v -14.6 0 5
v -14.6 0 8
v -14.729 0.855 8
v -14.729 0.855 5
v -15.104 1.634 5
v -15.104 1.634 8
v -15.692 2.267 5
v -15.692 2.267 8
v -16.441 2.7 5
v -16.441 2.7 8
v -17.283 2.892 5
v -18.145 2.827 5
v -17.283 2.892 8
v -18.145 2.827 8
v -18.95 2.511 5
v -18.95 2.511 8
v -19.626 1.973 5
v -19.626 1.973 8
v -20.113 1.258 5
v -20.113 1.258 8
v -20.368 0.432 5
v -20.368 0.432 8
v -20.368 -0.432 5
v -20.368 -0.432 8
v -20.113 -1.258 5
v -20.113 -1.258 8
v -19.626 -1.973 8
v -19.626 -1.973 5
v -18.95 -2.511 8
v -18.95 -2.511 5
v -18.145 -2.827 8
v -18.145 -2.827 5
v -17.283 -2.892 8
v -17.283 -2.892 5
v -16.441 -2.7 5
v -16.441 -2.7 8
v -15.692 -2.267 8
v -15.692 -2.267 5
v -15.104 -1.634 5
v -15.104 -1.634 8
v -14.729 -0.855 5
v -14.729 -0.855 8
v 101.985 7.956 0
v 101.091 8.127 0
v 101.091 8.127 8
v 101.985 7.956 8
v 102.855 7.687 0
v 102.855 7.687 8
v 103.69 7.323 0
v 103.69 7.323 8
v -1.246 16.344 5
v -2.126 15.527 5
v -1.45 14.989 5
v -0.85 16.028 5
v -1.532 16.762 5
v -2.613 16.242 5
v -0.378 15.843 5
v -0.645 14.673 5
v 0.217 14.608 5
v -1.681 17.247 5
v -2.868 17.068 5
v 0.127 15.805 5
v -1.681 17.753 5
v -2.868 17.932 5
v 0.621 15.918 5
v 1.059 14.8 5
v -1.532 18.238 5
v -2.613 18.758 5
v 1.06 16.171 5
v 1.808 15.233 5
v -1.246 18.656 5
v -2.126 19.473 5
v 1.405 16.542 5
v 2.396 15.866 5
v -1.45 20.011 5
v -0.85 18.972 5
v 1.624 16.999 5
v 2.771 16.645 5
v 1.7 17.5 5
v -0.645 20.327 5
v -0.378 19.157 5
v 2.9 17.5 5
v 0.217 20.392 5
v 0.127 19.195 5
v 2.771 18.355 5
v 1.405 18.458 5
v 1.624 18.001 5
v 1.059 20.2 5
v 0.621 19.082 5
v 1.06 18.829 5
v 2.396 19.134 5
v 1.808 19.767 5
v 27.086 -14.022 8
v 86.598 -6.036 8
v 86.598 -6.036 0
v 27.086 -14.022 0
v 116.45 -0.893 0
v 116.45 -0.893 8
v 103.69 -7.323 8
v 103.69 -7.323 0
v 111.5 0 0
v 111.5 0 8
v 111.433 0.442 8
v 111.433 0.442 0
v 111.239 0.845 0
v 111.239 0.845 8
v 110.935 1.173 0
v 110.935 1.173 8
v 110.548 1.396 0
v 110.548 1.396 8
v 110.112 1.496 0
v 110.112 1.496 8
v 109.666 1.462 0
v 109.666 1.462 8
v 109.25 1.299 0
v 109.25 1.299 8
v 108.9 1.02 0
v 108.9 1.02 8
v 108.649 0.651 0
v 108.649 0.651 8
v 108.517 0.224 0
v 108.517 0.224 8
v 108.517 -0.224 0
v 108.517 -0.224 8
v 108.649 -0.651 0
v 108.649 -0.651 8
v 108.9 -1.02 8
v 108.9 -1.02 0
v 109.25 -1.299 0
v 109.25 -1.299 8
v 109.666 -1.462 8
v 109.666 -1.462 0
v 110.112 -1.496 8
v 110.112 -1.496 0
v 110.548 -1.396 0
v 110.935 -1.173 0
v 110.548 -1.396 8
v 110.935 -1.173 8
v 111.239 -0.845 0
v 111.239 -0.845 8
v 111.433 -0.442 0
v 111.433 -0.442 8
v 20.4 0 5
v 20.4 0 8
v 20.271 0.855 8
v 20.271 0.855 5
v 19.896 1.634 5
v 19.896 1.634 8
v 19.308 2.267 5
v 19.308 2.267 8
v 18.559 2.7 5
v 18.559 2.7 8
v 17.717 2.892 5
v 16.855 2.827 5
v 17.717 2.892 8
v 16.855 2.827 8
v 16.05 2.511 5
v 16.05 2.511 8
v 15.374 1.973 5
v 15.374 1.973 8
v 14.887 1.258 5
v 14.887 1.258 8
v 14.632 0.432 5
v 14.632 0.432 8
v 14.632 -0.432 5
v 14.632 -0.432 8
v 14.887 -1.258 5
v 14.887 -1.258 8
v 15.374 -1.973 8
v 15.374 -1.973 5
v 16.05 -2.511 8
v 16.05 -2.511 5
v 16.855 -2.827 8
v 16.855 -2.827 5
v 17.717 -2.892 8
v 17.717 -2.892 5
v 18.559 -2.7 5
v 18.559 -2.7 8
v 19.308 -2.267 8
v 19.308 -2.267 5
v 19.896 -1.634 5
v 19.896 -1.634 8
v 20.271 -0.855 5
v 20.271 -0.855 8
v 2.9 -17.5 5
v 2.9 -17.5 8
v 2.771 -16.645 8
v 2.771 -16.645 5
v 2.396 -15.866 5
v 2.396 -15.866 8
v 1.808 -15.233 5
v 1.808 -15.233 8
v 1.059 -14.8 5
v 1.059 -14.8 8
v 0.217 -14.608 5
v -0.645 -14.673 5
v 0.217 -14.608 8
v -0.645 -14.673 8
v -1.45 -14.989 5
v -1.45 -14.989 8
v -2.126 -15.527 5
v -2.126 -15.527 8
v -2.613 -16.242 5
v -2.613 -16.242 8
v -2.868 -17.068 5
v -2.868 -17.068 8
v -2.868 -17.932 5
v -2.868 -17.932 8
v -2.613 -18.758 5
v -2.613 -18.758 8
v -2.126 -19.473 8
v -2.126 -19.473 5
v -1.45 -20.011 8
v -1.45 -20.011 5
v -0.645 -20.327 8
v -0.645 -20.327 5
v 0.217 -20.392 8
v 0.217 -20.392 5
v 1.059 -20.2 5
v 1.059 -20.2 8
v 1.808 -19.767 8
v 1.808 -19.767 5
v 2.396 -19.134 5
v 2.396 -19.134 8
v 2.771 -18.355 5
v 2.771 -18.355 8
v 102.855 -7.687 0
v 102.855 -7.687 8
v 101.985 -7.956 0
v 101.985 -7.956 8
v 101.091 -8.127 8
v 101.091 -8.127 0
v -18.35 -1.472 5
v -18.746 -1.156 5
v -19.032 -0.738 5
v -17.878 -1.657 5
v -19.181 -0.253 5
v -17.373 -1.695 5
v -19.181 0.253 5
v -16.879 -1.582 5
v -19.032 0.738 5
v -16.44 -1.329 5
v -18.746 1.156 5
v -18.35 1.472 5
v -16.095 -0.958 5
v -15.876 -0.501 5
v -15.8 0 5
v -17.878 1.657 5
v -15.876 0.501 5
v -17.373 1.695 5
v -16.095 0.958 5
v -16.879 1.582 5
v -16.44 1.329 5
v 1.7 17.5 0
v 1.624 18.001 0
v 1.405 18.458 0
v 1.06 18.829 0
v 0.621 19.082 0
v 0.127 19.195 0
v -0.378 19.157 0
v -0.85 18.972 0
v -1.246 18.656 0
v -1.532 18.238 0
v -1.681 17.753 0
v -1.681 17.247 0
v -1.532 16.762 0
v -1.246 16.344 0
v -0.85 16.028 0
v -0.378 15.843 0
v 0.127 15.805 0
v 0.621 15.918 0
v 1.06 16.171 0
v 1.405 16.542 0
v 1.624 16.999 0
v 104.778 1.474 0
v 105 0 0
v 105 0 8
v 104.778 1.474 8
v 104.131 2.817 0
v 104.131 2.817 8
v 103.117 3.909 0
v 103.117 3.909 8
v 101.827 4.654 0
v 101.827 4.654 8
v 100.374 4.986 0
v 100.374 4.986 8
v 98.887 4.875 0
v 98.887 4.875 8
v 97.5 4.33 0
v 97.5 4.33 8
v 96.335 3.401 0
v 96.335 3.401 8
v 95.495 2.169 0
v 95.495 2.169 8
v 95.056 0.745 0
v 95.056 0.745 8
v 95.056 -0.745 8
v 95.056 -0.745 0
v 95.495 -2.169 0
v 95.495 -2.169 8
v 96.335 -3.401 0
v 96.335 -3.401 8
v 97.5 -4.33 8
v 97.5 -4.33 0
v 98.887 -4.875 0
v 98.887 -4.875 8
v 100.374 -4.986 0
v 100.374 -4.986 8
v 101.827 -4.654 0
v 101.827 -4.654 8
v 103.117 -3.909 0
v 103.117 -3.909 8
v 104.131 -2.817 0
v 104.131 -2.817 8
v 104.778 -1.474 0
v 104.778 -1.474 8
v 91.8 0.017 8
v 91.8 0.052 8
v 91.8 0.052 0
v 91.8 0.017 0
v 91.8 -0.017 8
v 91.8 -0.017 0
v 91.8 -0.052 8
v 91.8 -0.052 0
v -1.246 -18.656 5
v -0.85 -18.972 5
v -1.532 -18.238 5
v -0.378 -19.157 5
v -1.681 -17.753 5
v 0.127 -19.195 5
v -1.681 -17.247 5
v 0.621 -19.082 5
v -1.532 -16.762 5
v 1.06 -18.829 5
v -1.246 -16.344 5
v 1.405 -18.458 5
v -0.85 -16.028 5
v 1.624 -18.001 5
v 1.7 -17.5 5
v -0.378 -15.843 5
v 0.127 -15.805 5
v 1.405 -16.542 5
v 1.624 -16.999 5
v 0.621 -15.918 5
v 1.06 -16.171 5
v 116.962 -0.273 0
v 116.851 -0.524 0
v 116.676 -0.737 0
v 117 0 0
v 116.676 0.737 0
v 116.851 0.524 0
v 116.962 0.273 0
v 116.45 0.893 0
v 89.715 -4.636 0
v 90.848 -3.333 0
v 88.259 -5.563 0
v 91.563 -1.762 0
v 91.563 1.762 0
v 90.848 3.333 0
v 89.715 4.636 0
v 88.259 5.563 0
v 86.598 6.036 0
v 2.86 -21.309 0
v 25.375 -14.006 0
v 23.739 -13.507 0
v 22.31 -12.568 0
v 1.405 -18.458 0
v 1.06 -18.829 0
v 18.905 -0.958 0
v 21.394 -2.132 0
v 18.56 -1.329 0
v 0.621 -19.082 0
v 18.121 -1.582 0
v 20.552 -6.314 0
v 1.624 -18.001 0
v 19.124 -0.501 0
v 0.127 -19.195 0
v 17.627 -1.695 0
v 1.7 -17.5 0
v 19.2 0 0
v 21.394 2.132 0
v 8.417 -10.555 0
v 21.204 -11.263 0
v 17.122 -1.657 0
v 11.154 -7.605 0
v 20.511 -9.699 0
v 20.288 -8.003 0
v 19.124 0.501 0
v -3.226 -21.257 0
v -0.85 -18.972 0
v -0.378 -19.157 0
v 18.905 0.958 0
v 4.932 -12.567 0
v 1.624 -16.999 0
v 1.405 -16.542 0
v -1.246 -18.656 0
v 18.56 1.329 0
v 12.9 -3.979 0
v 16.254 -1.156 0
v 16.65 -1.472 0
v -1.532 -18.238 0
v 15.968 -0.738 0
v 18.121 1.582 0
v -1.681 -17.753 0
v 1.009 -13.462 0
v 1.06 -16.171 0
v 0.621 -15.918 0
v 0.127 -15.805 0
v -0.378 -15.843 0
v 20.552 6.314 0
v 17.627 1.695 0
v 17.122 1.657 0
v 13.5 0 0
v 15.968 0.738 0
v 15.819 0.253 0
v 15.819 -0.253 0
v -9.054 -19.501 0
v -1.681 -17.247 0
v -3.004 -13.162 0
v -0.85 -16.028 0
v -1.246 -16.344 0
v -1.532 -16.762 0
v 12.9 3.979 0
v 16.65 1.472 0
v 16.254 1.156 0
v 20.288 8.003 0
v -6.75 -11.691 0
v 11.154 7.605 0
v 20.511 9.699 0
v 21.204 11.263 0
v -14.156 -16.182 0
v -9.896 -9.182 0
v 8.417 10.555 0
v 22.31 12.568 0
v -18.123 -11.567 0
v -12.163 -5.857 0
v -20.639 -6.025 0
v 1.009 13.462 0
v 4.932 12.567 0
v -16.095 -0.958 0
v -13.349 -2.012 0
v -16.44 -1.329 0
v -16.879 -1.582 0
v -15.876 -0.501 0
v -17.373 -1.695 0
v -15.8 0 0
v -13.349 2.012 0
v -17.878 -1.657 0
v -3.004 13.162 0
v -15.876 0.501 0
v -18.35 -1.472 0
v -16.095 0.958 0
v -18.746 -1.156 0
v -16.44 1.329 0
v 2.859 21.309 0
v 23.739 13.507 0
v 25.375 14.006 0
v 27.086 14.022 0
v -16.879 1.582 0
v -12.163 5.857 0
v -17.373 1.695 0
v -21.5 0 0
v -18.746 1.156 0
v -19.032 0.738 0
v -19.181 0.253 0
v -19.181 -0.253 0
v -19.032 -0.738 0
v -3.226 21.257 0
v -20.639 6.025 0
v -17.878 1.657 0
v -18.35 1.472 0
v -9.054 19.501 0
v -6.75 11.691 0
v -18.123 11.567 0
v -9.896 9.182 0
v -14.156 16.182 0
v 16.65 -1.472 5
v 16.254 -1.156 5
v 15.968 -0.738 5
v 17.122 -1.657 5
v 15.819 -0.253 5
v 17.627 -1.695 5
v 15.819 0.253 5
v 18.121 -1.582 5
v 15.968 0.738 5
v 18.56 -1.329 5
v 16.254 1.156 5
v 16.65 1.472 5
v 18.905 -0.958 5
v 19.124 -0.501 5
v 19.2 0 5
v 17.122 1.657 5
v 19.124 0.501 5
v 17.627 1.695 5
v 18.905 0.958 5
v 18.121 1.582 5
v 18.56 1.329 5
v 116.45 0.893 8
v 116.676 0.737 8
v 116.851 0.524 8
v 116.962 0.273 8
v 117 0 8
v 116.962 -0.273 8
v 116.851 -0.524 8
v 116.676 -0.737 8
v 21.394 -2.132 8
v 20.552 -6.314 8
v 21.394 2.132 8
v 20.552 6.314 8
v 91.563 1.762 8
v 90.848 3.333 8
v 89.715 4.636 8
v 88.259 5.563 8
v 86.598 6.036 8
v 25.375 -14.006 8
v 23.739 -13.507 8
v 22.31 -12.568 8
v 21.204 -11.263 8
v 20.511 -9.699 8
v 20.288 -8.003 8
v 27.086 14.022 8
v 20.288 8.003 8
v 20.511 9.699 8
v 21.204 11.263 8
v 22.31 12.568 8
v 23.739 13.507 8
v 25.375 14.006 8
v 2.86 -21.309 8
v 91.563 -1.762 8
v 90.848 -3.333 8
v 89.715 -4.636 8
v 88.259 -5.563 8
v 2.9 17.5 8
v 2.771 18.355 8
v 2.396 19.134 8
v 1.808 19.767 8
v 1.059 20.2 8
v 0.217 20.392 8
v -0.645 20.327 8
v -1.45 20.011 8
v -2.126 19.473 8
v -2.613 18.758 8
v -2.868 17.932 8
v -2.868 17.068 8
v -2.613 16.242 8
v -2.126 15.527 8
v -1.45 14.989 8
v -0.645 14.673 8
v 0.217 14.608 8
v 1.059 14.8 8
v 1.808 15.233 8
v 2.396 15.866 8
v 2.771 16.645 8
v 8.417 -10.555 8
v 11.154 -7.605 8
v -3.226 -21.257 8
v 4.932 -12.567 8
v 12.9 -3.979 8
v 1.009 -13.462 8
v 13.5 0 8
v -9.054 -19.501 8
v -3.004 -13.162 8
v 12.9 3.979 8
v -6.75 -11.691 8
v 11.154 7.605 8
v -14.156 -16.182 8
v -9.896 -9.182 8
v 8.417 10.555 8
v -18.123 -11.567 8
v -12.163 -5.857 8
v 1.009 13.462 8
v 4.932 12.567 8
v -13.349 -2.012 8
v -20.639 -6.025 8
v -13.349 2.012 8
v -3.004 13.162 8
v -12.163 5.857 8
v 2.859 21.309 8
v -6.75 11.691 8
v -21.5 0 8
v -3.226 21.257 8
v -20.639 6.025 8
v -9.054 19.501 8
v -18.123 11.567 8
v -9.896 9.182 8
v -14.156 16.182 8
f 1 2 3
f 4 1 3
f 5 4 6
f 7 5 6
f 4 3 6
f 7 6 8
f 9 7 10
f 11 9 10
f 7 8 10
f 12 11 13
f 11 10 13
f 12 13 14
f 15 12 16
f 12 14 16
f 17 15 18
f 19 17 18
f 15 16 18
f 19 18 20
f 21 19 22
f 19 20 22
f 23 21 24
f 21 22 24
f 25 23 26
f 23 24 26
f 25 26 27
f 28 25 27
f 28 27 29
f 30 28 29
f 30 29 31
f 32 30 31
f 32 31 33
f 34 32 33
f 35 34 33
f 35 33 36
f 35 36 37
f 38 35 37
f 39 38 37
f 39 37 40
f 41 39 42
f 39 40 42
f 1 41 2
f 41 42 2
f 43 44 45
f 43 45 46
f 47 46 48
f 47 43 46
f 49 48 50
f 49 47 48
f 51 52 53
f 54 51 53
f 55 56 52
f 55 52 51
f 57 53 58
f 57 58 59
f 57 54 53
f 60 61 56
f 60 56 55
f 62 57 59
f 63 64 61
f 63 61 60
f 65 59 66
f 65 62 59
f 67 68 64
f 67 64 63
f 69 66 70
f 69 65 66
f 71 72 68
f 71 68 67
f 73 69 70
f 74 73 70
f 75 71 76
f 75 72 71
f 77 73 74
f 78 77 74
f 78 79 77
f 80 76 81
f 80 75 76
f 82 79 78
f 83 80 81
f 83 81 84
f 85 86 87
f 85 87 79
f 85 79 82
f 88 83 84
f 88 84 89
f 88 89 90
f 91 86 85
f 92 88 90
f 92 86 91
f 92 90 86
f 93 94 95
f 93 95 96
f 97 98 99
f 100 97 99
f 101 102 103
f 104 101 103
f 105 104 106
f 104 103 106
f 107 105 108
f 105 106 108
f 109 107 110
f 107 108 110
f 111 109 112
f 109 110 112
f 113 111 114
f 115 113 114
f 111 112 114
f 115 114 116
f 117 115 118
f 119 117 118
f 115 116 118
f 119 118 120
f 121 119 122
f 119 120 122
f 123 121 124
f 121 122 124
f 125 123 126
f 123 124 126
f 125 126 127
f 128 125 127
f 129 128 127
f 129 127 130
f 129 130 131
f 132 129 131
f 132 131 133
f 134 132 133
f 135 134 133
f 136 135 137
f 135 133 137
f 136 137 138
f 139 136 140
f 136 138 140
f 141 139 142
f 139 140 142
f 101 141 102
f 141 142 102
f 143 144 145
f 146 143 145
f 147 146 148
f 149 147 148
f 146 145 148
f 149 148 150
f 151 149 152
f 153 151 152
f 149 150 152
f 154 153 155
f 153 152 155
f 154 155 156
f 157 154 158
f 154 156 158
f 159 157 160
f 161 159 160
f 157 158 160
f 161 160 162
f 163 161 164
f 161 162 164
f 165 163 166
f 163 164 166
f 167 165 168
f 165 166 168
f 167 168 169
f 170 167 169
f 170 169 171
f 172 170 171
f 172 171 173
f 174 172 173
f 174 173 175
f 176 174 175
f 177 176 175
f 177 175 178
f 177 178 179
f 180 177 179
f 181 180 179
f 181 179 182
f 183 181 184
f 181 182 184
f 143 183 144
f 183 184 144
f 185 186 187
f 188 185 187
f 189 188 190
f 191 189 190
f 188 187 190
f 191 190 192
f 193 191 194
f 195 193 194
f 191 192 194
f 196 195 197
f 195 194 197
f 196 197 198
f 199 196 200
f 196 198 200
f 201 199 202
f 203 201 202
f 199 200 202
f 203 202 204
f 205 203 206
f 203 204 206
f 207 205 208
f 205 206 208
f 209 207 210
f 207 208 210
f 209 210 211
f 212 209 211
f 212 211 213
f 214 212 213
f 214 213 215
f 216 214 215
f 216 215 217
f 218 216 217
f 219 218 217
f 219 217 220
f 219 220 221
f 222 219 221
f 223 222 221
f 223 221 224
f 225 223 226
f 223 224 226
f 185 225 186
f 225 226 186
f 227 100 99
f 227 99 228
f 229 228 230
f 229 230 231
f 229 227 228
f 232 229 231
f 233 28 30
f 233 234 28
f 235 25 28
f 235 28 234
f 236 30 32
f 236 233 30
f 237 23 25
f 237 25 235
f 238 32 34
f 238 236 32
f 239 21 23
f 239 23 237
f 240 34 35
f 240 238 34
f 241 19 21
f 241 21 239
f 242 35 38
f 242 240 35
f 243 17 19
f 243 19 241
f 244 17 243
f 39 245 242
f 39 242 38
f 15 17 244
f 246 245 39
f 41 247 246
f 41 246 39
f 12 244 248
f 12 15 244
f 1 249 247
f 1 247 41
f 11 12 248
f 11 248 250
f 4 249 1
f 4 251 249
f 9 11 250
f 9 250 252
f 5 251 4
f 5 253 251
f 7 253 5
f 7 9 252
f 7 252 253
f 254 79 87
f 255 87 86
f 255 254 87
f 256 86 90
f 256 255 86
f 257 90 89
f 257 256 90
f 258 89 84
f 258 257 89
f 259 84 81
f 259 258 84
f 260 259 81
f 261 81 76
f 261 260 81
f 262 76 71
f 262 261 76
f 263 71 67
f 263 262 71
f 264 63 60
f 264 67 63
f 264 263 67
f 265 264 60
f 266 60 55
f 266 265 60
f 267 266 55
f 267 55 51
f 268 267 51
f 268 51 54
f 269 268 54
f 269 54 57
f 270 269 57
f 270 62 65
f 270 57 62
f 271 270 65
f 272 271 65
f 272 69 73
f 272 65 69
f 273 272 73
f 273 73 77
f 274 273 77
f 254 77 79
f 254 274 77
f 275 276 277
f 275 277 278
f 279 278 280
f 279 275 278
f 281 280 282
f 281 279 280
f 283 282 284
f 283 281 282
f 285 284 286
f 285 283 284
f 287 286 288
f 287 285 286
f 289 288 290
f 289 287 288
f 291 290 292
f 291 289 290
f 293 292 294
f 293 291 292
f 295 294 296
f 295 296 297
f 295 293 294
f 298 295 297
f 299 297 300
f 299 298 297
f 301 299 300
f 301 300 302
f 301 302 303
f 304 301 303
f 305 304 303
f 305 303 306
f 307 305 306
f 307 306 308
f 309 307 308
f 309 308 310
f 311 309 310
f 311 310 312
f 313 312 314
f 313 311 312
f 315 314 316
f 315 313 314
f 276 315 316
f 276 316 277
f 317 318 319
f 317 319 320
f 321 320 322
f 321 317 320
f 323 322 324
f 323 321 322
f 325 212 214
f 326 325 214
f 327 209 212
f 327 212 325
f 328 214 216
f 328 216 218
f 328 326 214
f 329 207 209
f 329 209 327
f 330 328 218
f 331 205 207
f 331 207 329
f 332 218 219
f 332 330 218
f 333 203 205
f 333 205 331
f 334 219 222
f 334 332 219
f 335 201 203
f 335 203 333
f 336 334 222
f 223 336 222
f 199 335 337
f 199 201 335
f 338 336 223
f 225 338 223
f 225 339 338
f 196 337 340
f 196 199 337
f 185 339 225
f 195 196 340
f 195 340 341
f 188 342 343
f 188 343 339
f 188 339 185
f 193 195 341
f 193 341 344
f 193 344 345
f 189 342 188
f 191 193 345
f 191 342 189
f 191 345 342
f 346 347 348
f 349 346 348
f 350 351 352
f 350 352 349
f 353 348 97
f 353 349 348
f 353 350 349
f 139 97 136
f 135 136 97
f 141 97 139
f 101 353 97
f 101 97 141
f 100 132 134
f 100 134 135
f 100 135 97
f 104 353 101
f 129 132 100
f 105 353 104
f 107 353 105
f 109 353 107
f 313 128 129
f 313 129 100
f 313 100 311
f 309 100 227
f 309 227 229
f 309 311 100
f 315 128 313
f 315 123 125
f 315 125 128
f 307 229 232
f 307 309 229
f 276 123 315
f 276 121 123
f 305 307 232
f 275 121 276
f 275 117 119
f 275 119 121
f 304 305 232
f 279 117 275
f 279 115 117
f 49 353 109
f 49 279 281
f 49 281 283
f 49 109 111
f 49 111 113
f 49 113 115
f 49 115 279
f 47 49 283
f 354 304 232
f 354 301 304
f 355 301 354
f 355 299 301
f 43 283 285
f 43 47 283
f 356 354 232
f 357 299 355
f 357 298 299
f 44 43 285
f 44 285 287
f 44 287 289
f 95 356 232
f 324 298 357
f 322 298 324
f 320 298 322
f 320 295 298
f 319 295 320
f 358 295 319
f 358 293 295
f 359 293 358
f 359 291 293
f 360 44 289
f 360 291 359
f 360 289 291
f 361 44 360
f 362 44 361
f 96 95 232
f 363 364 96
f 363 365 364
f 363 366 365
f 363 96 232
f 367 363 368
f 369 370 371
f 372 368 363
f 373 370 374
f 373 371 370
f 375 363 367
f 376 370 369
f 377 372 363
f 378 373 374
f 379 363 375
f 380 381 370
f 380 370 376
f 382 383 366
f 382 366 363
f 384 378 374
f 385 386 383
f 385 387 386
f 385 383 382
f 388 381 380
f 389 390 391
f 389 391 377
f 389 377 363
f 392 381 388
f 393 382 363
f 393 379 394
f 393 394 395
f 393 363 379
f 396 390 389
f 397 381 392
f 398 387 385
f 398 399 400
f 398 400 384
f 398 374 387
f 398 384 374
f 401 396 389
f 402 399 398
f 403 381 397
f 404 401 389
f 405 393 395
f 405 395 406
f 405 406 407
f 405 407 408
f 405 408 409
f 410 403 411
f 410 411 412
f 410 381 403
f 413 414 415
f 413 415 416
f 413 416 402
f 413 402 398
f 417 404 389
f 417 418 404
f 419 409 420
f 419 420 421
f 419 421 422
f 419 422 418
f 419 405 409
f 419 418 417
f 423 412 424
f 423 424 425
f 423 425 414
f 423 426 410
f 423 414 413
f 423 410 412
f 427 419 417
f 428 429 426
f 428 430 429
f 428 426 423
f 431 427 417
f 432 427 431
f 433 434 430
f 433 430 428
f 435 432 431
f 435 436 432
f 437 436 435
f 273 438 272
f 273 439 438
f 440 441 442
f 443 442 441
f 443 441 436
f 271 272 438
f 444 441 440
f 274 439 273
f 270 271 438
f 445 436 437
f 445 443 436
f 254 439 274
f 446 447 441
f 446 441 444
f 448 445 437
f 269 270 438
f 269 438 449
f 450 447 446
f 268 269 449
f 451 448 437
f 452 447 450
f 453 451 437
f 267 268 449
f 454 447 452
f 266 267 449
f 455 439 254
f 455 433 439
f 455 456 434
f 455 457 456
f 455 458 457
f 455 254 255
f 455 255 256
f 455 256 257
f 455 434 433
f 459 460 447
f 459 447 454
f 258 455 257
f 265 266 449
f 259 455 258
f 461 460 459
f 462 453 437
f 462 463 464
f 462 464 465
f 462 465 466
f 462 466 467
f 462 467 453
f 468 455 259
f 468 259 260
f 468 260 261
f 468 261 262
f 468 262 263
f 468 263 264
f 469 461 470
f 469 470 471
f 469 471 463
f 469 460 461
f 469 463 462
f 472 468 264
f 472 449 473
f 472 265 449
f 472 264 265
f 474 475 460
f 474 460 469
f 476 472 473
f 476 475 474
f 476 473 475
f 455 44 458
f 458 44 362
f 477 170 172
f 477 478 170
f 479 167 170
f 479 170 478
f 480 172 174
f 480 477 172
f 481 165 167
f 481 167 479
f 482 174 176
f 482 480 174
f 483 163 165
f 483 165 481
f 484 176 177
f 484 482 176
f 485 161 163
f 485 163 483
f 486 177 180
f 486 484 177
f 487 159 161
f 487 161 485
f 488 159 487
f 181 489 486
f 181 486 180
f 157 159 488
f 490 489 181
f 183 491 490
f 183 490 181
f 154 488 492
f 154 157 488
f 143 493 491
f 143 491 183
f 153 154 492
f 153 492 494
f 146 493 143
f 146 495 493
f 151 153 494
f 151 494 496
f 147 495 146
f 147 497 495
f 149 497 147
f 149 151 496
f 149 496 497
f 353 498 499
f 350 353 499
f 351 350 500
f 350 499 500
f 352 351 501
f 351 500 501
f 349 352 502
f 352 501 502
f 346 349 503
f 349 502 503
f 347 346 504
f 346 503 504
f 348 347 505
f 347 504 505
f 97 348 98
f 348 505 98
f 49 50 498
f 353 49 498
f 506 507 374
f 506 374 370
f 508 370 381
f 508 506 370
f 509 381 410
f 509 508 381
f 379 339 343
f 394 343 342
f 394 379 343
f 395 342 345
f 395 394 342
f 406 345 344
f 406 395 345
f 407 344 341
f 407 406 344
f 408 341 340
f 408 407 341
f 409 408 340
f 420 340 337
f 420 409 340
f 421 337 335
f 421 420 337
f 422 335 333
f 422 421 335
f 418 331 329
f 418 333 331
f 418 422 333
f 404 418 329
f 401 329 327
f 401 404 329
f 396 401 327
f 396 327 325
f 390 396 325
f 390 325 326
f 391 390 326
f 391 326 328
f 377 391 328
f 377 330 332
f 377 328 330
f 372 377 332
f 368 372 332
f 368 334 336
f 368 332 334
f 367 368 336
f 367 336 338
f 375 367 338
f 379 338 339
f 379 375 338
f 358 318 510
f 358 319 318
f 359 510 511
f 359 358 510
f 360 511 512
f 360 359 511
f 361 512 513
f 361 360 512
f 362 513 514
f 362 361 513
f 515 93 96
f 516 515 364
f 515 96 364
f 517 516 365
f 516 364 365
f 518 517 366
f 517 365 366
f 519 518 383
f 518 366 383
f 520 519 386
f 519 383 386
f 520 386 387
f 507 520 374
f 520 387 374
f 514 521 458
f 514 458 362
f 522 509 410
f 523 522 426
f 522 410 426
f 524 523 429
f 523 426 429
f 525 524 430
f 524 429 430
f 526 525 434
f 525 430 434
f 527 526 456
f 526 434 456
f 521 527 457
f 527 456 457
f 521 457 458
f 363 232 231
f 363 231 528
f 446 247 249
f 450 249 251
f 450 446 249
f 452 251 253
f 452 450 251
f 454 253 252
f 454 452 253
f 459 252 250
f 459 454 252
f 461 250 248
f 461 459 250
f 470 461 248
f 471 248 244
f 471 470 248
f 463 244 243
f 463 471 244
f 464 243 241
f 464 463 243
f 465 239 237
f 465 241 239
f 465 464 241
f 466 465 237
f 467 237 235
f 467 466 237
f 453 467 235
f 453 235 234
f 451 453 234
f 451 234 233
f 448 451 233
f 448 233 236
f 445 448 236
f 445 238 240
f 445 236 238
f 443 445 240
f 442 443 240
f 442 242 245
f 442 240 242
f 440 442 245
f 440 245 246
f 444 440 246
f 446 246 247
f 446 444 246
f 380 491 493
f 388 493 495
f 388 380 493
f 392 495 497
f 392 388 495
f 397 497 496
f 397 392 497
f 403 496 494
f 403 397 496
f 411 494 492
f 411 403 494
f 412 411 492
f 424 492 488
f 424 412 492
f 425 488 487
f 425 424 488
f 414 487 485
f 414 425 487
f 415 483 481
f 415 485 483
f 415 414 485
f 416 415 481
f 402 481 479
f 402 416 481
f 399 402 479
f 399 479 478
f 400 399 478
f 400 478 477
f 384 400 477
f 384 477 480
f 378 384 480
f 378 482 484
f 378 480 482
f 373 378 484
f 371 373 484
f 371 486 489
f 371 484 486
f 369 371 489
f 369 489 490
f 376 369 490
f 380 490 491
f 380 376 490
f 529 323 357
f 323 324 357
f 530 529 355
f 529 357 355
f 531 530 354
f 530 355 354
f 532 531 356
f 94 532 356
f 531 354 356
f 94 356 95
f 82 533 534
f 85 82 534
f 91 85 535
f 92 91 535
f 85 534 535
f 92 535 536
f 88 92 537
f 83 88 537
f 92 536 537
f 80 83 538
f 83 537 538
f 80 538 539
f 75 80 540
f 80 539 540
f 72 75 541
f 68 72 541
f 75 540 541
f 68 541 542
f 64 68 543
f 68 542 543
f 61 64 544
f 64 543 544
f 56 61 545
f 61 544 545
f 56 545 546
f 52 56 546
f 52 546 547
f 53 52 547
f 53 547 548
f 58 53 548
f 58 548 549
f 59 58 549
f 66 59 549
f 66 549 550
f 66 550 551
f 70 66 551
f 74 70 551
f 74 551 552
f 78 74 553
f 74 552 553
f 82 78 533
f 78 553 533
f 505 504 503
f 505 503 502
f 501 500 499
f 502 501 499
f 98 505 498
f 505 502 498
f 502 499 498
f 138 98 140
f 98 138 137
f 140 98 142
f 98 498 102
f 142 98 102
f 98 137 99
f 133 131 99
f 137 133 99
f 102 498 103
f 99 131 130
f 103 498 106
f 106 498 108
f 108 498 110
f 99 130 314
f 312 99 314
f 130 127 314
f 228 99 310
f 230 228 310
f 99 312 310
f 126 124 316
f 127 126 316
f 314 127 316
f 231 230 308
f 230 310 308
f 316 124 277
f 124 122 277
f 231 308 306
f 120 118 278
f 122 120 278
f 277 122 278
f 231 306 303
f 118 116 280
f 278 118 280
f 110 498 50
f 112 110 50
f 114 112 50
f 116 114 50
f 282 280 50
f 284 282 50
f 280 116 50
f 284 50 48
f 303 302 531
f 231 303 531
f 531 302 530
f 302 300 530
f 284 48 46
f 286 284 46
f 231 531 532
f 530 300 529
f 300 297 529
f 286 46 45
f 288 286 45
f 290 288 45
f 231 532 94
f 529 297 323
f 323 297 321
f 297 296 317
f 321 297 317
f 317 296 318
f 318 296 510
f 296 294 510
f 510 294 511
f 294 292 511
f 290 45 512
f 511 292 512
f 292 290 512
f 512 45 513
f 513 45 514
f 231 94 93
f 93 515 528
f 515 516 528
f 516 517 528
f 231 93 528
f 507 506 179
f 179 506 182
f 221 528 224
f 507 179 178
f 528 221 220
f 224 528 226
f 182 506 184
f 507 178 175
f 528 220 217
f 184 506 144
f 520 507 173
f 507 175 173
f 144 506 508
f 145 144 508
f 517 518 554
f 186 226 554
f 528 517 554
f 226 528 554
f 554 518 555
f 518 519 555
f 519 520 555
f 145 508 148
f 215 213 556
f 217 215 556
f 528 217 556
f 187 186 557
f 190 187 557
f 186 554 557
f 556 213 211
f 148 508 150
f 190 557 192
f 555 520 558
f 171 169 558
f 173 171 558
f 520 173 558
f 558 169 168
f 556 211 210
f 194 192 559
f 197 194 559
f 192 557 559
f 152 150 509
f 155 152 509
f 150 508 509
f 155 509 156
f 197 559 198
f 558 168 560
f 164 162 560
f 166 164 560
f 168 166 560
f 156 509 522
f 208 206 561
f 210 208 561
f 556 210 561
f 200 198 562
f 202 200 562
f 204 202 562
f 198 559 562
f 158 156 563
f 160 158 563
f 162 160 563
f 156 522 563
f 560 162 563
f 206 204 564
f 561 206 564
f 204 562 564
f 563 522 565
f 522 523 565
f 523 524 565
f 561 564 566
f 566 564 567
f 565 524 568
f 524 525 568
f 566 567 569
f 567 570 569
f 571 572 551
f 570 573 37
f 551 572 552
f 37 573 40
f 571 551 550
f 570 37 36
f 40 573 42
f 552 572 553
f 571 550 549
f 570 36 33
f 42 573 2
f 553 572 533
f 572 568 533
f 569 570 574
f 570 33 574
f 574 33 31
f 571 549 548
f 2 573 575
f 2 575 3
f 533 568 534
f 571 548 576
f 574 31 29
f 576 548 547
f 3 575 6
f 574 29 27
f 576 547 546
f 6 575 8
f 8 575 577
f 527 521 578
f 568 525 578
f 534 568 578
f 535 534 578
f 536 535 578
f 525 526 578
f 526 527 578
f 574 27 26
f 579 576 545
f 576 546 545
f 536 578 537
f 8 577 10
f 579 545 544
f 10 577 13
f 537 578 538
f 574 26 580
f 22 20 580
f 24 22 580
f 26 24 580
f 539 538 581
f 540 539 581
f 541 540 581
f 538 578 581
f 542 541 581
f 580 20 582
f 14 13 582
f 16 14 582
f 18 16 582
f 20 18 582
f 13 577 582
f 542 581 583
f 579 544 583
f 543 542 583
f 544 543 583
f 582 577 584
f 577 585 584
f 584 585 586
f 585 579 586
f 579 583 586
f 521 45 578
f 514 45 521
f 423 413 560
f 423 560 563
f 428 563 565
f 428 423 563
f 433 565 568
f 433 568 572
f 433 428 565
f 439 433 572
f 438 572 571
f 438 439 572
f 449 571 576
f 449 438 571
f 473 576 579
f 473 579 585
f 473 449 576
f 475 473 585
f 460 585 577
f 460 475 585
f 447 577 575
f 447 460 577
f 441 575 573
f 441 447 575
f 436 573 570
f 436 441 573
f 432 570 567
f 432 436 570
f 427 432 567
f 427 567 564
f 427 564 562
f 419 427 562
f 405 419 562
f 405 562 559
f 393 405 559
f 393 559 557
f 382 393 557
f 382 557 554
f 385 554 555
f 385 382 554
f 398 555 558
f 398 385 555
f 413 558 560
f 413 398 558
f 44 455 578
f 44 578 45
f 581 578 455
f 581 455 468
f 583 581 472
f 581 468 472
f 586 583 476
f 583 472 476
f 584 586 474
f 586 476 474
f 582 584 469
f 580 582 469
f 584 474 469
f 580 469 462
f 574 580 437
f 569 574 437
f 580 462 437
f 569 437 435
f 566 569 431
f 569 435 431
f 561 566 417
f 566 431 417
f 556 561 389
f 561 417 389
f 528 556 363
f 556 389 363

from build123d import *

# Parameters (mm, degrees)
ESQUISSE1_R             = 21.5
ESQUISSE1_R_2           = 1.7
ESQUISSE1_R_3           = 13.5
BOSS_EXTRU_1_DEPTH      = 8
BOSS_EXTRU_2_START      = -8
ESQUISSE2_R             = 5
BOSS_EXTRU_2_DEPTH      = 8
ENL_V_MAT_EXTRU_1_DEPTH = 111.605108381
CONG_1_R                = 6
ESQUISSE4_R             = 1.5
BOSS_EXTRU_3_DEPTH      = 8
ESQUISSE5_R             = 2.9
ENL_V_MAT_EXTRU_2_DEPTH = 3


with BuildPart() as part:
    # Esquisse1 → Boss.-Extru.1 (new body)
    with BuildSketch(Plane.XY):
        Circle(ESQUISSE1_R)
        with Locations((0, 17.5)):
            Circle(ESQUISSE1_R_2, mode=Mode.SUBTRACT)
        with Locations((17.5, 0)):
            Circle(ESQUISSE1_R_2, mode=Mode.SUBTRACT)
        with Locations((0, -17.5)):
            Circle(ESQUISSE1_R_2, mode=Mode.SUBTRACT)
        with Locations((-17.5, 0)):
            Circle(ESQUISSE1_R_2, mode=Mode.SUBTRACT)
        Circle(ESQUISSE1_R_3, mode=Mode.SUBTRACT)
    extrude(amount=BOSS_EXTRU_1_DEPTH)

    # Esquisse2 → Boss.-Extru.2 (add)
    with BuildSketch(Plane.XY.offset(8).offset(BOSS_EXTRU_2_START)):
        with BuildLine():
            Line((2.8595, 21.308994809), (101.0906, 8.127151508))
            ThreePointArc((101.0906, 8.127151508), (108.2, 0), (101.0906, -8.127151508))
            Line((101.0906, -8.127151508), (2.8595, -21.308994809))
            ThreePointArc((2.8595, -21.308994809), (21.5, 0), (2.8595, 21.308994809))
        make_face()
        with Locations((100, 0)):
            Circle(ESQUISSE2_R, mode=Mode.SUBTRACT)
    extrude(amount=BOSS_EXTRU_2_DEPTH)

    # Esquisse3 → Enlèv. mat.-Extru.1 (cut, through all)
    with BuildSketch(Plane.XY.offset(8)):
        with BuildLine():
            Line((14.706535342, 15.683361191), (93.578440575, 5.099370015))
            ThreePointArc((93.578440575, 5.099370015), (91.8, 0), (93.578440575, -5.099370015))
            Line((93.578440575, -5.099370015), (14.706535342, -15.683361191))
            ThreePointArc((14.706535342, -15.683361191), (21.5, 0), (14.706535342, 15.683361191))
        make_face()
    extrude(amount=-ENL_V_MAT_EXTRU_1_DEPTH, mode=Mode.SUBTRACT)

    # Congé1
    cong_1_edges = [part.edges().sort_by_distance(p)[0] for p in [
        (14.706535342, -15.683361191, 4),
        (14.706535342, 15.683361191, 4),
        (93.578440575, 5.099370015, 4),
        (93.578440575, -5.099370015, 4),
    ]]
    fillet(cong_1_edges, radius=CONG_1_R)

    # Esquisse4 → Boss.-Extru.3 (add)
    with BuildSketch(Plane.XY.offset(8)):
        with BuildLine():
            Line((103.69, 7.322834151), (116.45, 0.893028555))
            ThreePointArc((116.45, 0.893028555), (117, 0), (116.45, -0.893028555))
            Line((116.45, -0.893028555), (103.69, -7.322834151))
            ThreePointArc((103.69, -7.322834151), (108.2, 0), (103.69, 7.322834151))
        make_face()
        with Locations((110, 0)):
            Circle(ESQUISSE4_R, mode=Mode.SUBTRACT)
    extrude(amount=-BOSS_EXTRU_3_DEPTH)

    # Esquisse5 → Enlèv. mat.-Extru.2 (cut)
    with BuildSketch(Plane.XY.offset(8)):
        with Locations((0, 17.5)):
            Circle(ESQUISSE5_R)
        with Locations((17.5, 0)):
            Circle(ESQUISSE5_R)
        with Locations((0, -17.5)):
            Circle(ESQUISSE5_R)
        with Locations((-17.5, 0)):
            Circle(ESQUISSE5_R)
    extrude(amount=-ENL_V_MAT_EXTRU_2_DEPTH, mode=Mode.SUBTRACT)


solid = part.part
